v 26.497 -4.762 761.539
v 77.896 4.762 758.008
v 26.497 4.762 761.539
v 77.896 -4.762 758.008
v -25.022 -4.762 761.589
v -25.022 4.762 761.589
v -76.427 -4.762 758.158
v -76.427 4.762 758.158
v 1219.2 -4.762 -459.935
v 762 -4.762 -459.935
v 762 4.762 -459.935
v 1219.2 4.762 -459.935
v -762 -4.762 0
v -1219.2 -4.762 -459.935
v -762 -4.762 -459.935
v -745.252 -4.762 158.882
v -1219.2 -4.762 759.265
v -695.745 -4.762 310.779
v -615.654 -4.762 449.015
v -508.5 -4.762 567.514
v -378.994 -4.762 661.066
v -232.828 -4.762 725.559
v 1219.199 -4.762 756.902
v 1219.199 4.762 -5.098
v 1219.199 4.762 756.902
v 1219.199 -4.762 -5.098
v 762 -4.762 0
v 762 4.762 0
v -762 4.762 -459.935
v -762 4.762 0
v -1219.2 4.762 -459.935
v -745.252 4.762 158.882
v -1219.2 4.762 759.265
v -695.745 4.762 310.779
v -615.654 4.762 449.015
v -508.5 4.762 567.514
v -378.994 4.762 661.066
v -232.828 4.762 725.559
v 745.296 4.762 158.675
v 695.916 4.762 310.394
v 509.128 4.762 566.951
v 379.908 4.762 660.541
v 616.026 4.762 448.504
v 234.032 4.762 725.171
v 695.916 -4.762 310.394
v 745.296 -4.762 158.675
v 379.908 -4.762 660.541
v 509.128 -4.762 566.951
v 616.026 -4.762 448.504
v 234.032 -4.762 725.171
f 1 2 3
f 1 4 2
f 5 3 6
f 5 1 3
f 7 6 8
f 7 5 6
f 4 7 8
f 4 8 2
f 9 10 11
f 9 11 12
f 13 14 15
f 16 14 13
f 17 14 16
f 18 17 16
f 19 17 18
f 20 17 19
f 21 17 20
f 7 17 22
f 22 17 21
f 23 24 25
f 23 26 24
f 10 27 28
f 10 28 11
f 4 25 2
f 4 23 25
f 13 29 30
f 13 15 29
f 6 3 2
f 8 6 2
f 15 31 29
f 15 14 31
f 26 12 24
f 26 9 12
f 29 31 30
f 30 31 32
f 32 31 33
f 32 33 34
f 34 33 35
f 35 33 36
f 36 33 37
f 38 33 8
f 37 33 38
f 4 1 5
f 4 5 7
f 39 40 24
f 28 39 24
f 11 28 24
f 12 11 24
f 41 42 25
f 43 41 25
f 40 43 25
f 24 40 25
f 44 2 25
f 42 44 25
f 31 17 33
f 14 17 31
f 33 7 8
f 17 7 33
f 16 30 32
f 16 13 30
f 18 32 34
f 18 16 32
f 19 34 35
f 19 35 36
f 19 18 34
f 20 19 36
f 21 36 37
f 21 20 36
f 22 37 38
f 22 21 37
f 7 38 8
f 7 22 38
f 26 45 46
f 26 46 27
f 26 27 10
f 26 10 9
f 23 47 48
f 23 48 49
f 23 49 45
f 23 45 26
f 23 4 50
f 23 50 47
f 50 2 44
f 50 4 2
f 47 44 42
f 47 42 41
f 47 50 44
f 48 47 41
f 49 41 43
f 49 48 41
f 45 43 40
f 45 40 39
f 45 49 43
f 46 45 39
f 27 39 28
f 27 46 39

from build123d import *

# Parameters (mm, degrees)
F1_DEPTH = 4.7625


with BuildPart() as f1:
    # F0 (on Front) → F1 (new body, symmetric)
    with BuildSketch(Plane.XZ):
        with BuildLine():
            Line((-762, -459.935337), (-762, 0))
            ThreePointArc((-762, 0), (-565.190818, 511.080561), (-76.426931, 758.157585))
            Line((-76.426931, 758.157585), (-1219.2, 759.264663))
            Line((-1219.2, 759.264663), (-1219.2, -5.09757))
            Line((-1219.2, -5.09757), (-1219.2, -459.935337))
            Line((-1219.2, -459.935337), (-762, -459.935337))
        make_face()
        with BuildLine():
            Line((1219.198856, 756.90243), (77.895737, 758.008083))
            ThreePointArc((77.895737, 758.008083), (565.685669, 510.532785), (762, 0))
            Line((762, 0), (762, -459.935337))
            Line((762, -459.935337), (1219.2, -459.935337))
            Line((1219.2, -459.935337), (1219.198856, -5.09757))
            Line((1219.198856, -5.09757), (1219.198856, 756.90243))
        make_face()
        with BuildLine():
            ThreePointArc((77.895737, 758.008083), (0.738198, 761.999642), (-76.426931, 758.157585))
            Line((-76.426931, 758.157585), (77.895737, 758.008083))
        make_face()
    extrude(amount=F1_DEPTH, both=True)


solid = f1.part
